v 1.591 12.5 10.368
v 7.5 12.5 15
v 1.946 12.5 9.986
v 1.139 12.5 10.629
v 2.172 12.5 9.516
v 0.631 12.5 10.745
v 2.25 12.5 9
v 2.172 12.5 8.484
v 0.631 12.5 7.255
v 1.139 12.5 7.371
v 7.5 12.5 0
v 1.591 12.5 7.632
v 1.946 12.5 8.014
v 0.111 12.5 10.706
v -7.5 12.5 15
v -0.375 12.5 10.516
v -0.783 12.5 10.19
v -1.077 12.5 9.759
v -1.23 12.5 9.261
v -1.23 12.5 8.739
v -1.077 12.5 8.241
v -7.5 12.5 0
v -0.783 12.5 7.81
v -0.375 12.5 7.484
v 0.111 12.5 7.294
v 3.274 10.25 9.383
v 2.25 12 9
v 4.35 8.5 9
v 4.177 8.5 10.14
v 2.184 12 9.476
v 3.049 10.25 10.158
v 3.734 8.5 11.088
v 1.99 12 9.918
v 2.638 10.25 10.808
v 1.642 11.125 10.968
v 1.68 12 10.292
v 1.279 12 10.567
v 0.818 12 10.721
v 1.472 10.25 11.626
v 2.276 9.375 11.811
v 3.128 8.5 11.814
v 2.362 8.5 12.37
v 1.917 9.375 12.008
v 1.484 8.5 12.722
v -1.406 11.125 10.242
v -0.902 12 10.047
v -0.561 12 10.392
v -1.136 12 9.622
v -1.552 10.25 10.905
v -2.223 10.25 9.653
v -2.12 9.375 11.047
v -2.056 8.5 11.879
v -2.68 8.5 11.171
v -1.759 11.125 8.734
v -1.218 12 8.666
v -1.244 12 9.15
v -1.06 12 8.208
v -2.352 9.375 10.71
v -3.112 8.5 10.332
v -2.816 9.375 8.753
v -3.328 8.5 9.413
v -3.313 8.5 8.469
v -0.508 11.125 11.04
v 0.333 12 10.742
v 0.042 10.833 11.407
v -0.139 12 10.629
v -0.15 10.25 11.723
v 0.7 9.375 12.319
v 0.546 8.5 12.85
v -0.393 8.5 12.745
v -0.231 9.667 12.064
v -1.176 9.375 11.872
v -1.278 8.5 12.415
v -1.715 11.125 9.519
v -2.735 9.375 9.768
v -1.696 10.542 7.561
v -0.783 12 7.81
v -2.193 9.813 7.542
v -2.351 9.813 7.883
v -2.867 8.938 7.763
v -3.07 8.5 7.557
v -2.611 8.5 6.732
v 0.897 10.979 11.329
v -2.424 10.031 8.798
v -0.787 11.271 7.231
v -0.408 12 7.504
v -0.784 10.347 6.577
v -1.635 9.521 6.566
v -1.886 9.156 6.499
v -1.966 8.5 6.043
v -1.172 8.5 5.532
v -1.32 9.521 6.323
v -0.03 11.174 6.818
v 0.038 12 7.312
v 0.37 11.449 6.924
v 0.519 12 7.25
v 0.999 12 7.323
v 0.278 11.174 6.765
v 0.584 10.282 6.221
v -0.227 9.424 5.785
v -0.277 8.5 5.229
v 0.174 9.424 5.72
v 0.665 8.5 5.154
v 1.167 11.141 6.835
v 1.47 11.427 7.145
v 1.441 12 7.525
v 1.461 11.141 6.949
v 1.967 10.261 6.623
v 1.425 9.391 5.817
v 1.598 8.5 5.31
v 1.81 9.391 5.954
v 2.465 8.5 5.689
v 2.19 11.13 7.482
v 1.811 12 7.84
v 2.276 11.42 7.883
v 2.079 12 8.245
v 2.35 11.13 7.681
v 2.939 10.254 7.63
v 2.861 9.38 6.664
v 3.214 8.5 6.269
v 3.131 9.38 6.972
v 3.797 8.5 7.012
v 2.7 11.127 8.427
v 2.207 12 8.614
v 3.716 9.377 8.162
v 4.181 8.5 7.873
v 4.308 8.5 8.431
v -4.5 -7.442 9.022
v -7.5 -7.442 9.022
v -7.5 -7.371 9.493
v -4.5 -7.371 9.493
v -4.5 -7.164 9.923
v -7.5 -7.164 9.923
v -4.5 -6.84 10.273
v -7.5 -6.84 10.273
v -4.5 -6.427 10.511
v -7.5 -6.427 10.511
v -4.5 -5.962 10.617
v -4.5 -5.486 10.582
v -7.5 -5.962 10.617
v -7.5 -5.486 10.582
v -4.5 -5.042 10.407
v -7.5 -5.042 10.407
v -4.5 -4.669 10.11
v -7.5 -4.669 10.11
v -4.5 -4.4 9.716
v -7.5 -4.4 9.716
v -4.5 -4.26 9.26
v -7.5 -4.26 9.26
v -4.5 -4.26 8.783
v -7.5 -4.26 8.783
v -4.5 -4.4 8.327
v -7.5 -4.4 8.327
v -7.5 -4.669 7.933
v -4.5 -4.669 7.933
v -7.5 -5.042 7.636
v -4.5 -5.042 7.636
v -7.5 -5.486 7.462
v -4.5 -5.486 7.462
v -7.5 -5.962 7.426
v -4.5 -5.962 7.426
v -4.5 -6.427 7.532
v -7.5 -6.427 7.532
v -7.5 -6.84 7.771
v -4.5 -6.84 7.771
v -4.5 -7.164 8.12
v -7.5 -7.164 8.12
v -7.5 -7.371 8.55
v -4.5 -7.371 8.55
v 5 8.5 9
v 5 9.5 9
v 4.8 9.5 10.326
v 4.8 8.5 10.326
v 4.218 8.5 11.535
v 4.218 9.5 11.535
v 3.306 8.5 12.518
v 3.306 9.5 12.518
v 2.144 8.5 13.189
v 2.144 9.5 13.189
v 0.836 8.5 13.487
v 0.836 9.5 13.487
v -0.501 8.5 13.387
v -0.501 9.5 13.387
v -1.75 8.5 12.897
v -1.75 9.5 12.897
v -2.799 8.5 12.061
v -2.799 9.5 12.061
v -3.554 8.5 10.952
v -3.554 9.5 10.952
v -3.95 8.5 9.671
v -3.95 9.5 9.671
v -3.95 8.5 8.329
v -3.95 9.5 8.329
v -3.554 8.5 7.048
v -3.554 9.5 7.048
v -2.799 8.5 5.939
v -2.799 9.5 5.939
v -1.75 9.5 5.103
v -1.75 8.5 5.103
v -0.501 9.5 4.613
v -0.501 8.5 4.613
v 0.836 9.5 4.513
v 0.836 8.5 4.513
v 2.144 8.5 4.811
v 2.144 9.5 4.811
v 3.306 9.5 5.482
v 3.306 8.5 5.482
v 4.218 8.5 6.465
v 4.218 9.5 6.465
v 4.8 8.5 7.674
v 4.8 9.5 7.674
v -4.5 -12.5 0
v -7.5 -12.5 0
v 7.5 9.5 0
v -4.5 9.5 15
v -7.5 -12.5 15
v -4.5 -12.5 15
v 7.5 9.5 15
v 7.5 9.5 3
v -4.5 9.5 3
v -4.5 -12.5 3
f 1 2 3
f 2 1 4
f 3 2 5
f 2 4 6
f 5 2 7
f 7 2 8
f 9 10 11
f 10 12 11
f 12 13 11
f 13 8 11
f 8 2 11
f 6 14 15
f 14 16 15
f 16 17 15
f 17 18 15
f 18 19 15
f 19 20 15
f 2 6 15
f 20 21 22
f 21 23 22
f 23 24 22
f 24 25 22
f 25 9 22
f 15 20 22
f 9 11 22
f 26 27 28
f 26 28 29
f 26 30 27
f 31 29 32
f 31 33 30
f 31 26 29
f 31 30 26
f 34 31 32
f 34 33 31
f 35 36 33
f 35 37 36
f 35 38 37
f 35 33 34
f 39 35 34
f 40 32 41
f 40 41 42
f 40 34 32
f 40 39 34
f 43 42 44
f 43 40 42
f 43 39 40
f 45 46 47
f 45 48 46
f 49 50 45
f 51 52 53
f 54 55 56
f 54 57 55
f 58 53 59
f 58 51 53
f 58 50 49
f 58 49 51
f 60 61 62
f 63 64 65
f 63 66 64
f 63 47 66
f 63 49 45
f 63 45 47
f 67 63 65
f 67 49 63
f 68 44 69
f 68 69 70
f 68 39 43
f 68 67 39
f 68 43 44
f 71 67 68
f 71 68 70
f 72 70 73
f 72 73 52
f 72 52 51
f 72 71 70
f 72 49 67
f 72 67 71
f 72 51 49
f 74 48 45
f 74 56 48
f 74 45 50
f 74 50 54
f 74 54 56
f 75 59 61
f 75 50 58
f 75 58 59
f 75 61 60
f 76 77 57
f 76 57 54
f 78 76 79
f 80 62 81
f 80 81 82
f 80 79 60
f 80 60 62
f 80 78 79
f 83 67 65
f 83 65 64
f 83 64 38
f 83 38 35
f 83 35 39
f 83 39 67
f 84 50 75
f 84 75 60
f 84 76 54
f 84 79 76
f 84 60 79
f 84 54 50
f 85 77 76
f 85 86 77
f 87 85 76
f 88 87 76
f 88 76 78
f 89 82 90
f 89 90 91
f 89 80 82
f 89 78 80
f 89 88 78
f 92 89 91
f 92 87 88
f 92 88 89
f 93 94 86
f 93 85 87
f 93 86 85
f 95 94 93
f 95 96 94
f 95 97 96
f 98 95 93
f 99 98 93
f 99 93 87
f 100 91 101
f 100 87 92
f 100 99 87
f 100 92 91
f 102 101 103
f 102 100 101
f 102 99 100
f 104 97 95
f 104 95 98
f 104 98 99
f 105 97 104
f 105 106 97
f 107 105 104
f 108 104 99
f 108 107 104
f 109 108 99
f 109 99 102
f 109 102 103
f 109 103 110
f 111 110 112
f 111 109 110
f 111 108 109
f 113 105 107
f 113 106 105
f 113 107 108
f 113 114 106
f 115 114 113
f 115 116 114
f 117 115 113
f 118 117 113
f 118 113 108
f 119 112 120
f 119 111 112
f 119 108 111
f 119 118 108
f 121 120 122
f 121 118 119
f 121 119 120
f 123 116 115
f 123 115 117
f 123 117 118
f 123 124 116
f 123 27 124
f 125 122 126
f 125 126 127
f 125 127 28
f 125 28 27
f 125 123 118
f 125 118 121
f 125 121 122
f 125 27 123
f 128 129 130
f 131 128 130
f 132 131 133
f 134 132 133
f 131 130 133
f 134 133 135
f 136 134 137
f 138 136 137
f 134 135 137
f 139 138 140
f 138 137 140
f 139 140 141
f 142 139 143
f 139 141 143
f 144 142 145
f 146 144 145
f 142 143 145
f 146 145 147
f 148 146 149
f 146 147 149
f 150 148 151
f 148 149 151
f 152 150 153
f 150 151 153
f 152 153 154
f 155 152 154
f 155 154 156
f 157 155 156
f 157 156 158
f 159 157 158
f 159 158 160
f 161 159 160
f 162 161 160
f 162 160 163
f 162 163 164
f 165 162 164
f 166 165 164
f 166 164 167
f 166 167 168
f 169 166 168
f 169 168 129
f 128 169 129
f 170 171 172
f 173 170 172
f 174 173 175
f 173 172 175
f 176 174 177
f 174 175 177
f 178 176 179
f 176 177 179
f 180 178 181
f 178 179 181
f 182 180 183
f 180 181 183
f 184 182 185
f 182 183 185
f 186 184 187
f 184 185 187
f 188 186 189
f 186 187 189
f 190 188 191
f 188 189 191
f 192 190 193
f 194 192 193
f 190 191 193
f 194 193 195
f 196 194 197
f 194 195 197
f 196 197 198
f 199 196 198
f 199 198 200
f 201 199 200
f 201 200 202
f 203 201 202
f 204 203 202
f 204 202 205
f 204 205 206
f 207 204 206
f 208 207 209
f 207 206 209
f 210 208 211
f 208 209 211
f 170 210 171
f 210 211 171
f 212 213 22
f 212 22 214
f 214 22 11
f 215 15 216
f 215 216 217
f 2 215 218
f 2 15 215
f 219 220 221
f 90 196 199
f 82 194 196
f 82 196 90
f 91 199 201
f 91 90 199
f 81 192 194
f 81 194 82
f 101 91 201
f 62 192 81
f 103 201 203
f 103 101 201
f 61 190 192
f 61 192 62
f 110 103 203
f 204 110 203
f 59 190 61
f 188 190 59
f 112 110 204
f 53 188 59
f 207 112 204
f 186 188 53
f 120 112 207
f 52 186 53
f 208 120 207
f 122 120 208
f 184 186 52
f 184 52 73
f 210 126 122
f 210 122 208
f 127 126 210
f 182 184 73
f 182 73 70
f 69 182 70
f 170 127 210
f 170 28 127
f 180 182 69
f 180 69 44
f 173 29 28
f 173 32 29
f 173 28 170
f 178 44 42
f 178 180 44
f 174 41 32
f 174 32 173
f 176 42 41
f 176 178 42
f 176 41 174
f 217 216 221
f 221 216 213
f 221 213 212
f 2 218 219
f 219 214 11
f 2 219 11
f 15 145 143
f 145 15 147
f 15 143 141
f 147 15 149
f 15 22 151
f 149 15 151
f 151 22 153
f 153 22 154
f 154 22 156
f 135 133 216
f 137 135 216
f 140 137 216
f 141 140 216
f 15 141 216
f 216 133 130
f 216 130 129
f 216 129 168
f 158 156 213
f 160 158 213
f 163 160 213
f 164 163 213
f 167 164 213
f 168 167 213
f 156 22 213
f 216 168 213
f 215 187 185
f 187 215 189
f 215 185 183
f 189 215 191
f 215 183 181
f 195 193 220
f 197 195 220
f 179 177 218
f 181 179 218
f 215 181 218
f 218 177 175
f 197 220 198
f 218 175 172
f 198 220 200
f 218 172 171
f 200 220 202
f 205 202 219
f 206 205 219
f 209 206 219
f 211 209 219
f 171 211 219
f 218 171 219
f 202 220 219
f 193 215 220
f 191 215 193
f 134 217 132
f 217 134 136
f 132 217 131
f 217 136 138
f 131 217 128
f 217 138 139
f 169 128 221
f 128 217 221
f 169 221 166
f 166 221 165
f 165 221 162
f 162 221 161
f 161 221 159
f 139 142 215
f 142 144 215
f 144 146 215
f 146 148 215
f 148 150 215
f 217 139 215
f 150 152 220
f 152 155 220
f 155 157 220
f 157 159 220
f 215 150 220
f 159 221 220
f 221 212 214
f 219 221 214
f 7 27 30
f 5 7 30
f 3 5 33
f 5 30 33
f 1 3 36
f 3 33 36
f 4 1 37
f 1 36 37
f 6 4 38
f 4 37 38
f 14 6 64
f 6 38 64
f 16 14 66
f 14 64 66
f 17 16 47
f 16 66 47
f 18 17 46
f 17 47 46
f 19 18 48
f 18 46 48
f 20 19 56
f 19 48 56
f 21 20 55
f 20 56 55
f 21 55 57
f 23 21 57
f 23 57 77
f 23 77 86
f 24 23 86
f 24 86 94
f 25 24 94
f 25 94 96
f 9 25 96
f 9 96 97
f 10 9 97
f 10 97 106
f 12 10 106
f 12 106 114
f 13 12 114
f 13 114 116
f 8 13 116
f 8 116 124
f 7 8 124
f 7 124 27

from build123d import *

# Parameters (mm, degrees)
F1_DEPTH = 3
F2_DEPTH = 15
F3_R     = 1.6
F4_DEPTH = 25
F5_R     = 1.75
F6_DEPTH = 25
F5_R_2   = 4.5
F5_R_3   = 3.5
F7_DEPTH = 1
F8_SIZE2 = 2.1
F8_SIZE  = 3.5


with BuildPart() as f1:
    # F0 (on Top) → F1 (new body)
    with BuildSketch(Plane.XY):
        Polygon((-4.5, -12.5), (7.5, 9.5), (-4.5, 9.5), align=None)
    extrude(amount=F1_DEPTH)

    # F0 (on Top) → F2 (join)
    with BuildSketch(Plane.XY):
        Polygon((7.5, 9.5), (7.5, 12.5), (-7.5, 12.5), (-7.5, -12.5), (-4.5, -12.5), (-4.5, 9.5), align=None)
    extrude(amount=F2_DEPTH)

    # F3 (on face) → F4 (cut)
    with BuildSketch(Plane(origin=(-7.5, 0, 0), x_dir=(0, -1, 0), z_dir=(-1, 0, 0))):
        with Locations((5.8420459367, 9.0217133984)):
            Circle(F3_R)
    extrude(amount=-F4_DEPTH, mode=Mode.SUBTRACT)

    # F5 (on face) → F6 (cut)
    with BuildSketch(Plane.XZ.offset(-9.5)):
        with Locations((0.5, 9)):
            Circle(F5_R)
    extrude(amount=-F6_DEPTH, mode=Mode.SUBTRACT)

    # F5 (on face) → F7 (join)
    with BuildSketch(Plane.XZ.offset(-9.5)):
        with Locations((0.5, 9)):
            Circle(F5_R_2)
        with Locations((0.5, 9)):
            Circle(F5_R_3, mode=Mode.SUBTRACT)
        with Locations((0.5, 9)):
            Circle(F5_R_3)
        with Locations((0.5, 9)):
            Circle(F5_R, mode=Mode.SUBTRACT)
    extrude(amount=F7_DEPTH)

    # F8
    f8_edges = [f1.edges().sort_by_distance(p)[0] for p in [
        (-1.25, 8.5, 9),
    ]]
    f8_side = f1.faces().sort_by_distance((-1.25, 9, 9))[0]
    chamfer(f8_edges, length=F8_SIZE, length2=F8_SIZE2, reference=f8_side)


solid = f1.part
